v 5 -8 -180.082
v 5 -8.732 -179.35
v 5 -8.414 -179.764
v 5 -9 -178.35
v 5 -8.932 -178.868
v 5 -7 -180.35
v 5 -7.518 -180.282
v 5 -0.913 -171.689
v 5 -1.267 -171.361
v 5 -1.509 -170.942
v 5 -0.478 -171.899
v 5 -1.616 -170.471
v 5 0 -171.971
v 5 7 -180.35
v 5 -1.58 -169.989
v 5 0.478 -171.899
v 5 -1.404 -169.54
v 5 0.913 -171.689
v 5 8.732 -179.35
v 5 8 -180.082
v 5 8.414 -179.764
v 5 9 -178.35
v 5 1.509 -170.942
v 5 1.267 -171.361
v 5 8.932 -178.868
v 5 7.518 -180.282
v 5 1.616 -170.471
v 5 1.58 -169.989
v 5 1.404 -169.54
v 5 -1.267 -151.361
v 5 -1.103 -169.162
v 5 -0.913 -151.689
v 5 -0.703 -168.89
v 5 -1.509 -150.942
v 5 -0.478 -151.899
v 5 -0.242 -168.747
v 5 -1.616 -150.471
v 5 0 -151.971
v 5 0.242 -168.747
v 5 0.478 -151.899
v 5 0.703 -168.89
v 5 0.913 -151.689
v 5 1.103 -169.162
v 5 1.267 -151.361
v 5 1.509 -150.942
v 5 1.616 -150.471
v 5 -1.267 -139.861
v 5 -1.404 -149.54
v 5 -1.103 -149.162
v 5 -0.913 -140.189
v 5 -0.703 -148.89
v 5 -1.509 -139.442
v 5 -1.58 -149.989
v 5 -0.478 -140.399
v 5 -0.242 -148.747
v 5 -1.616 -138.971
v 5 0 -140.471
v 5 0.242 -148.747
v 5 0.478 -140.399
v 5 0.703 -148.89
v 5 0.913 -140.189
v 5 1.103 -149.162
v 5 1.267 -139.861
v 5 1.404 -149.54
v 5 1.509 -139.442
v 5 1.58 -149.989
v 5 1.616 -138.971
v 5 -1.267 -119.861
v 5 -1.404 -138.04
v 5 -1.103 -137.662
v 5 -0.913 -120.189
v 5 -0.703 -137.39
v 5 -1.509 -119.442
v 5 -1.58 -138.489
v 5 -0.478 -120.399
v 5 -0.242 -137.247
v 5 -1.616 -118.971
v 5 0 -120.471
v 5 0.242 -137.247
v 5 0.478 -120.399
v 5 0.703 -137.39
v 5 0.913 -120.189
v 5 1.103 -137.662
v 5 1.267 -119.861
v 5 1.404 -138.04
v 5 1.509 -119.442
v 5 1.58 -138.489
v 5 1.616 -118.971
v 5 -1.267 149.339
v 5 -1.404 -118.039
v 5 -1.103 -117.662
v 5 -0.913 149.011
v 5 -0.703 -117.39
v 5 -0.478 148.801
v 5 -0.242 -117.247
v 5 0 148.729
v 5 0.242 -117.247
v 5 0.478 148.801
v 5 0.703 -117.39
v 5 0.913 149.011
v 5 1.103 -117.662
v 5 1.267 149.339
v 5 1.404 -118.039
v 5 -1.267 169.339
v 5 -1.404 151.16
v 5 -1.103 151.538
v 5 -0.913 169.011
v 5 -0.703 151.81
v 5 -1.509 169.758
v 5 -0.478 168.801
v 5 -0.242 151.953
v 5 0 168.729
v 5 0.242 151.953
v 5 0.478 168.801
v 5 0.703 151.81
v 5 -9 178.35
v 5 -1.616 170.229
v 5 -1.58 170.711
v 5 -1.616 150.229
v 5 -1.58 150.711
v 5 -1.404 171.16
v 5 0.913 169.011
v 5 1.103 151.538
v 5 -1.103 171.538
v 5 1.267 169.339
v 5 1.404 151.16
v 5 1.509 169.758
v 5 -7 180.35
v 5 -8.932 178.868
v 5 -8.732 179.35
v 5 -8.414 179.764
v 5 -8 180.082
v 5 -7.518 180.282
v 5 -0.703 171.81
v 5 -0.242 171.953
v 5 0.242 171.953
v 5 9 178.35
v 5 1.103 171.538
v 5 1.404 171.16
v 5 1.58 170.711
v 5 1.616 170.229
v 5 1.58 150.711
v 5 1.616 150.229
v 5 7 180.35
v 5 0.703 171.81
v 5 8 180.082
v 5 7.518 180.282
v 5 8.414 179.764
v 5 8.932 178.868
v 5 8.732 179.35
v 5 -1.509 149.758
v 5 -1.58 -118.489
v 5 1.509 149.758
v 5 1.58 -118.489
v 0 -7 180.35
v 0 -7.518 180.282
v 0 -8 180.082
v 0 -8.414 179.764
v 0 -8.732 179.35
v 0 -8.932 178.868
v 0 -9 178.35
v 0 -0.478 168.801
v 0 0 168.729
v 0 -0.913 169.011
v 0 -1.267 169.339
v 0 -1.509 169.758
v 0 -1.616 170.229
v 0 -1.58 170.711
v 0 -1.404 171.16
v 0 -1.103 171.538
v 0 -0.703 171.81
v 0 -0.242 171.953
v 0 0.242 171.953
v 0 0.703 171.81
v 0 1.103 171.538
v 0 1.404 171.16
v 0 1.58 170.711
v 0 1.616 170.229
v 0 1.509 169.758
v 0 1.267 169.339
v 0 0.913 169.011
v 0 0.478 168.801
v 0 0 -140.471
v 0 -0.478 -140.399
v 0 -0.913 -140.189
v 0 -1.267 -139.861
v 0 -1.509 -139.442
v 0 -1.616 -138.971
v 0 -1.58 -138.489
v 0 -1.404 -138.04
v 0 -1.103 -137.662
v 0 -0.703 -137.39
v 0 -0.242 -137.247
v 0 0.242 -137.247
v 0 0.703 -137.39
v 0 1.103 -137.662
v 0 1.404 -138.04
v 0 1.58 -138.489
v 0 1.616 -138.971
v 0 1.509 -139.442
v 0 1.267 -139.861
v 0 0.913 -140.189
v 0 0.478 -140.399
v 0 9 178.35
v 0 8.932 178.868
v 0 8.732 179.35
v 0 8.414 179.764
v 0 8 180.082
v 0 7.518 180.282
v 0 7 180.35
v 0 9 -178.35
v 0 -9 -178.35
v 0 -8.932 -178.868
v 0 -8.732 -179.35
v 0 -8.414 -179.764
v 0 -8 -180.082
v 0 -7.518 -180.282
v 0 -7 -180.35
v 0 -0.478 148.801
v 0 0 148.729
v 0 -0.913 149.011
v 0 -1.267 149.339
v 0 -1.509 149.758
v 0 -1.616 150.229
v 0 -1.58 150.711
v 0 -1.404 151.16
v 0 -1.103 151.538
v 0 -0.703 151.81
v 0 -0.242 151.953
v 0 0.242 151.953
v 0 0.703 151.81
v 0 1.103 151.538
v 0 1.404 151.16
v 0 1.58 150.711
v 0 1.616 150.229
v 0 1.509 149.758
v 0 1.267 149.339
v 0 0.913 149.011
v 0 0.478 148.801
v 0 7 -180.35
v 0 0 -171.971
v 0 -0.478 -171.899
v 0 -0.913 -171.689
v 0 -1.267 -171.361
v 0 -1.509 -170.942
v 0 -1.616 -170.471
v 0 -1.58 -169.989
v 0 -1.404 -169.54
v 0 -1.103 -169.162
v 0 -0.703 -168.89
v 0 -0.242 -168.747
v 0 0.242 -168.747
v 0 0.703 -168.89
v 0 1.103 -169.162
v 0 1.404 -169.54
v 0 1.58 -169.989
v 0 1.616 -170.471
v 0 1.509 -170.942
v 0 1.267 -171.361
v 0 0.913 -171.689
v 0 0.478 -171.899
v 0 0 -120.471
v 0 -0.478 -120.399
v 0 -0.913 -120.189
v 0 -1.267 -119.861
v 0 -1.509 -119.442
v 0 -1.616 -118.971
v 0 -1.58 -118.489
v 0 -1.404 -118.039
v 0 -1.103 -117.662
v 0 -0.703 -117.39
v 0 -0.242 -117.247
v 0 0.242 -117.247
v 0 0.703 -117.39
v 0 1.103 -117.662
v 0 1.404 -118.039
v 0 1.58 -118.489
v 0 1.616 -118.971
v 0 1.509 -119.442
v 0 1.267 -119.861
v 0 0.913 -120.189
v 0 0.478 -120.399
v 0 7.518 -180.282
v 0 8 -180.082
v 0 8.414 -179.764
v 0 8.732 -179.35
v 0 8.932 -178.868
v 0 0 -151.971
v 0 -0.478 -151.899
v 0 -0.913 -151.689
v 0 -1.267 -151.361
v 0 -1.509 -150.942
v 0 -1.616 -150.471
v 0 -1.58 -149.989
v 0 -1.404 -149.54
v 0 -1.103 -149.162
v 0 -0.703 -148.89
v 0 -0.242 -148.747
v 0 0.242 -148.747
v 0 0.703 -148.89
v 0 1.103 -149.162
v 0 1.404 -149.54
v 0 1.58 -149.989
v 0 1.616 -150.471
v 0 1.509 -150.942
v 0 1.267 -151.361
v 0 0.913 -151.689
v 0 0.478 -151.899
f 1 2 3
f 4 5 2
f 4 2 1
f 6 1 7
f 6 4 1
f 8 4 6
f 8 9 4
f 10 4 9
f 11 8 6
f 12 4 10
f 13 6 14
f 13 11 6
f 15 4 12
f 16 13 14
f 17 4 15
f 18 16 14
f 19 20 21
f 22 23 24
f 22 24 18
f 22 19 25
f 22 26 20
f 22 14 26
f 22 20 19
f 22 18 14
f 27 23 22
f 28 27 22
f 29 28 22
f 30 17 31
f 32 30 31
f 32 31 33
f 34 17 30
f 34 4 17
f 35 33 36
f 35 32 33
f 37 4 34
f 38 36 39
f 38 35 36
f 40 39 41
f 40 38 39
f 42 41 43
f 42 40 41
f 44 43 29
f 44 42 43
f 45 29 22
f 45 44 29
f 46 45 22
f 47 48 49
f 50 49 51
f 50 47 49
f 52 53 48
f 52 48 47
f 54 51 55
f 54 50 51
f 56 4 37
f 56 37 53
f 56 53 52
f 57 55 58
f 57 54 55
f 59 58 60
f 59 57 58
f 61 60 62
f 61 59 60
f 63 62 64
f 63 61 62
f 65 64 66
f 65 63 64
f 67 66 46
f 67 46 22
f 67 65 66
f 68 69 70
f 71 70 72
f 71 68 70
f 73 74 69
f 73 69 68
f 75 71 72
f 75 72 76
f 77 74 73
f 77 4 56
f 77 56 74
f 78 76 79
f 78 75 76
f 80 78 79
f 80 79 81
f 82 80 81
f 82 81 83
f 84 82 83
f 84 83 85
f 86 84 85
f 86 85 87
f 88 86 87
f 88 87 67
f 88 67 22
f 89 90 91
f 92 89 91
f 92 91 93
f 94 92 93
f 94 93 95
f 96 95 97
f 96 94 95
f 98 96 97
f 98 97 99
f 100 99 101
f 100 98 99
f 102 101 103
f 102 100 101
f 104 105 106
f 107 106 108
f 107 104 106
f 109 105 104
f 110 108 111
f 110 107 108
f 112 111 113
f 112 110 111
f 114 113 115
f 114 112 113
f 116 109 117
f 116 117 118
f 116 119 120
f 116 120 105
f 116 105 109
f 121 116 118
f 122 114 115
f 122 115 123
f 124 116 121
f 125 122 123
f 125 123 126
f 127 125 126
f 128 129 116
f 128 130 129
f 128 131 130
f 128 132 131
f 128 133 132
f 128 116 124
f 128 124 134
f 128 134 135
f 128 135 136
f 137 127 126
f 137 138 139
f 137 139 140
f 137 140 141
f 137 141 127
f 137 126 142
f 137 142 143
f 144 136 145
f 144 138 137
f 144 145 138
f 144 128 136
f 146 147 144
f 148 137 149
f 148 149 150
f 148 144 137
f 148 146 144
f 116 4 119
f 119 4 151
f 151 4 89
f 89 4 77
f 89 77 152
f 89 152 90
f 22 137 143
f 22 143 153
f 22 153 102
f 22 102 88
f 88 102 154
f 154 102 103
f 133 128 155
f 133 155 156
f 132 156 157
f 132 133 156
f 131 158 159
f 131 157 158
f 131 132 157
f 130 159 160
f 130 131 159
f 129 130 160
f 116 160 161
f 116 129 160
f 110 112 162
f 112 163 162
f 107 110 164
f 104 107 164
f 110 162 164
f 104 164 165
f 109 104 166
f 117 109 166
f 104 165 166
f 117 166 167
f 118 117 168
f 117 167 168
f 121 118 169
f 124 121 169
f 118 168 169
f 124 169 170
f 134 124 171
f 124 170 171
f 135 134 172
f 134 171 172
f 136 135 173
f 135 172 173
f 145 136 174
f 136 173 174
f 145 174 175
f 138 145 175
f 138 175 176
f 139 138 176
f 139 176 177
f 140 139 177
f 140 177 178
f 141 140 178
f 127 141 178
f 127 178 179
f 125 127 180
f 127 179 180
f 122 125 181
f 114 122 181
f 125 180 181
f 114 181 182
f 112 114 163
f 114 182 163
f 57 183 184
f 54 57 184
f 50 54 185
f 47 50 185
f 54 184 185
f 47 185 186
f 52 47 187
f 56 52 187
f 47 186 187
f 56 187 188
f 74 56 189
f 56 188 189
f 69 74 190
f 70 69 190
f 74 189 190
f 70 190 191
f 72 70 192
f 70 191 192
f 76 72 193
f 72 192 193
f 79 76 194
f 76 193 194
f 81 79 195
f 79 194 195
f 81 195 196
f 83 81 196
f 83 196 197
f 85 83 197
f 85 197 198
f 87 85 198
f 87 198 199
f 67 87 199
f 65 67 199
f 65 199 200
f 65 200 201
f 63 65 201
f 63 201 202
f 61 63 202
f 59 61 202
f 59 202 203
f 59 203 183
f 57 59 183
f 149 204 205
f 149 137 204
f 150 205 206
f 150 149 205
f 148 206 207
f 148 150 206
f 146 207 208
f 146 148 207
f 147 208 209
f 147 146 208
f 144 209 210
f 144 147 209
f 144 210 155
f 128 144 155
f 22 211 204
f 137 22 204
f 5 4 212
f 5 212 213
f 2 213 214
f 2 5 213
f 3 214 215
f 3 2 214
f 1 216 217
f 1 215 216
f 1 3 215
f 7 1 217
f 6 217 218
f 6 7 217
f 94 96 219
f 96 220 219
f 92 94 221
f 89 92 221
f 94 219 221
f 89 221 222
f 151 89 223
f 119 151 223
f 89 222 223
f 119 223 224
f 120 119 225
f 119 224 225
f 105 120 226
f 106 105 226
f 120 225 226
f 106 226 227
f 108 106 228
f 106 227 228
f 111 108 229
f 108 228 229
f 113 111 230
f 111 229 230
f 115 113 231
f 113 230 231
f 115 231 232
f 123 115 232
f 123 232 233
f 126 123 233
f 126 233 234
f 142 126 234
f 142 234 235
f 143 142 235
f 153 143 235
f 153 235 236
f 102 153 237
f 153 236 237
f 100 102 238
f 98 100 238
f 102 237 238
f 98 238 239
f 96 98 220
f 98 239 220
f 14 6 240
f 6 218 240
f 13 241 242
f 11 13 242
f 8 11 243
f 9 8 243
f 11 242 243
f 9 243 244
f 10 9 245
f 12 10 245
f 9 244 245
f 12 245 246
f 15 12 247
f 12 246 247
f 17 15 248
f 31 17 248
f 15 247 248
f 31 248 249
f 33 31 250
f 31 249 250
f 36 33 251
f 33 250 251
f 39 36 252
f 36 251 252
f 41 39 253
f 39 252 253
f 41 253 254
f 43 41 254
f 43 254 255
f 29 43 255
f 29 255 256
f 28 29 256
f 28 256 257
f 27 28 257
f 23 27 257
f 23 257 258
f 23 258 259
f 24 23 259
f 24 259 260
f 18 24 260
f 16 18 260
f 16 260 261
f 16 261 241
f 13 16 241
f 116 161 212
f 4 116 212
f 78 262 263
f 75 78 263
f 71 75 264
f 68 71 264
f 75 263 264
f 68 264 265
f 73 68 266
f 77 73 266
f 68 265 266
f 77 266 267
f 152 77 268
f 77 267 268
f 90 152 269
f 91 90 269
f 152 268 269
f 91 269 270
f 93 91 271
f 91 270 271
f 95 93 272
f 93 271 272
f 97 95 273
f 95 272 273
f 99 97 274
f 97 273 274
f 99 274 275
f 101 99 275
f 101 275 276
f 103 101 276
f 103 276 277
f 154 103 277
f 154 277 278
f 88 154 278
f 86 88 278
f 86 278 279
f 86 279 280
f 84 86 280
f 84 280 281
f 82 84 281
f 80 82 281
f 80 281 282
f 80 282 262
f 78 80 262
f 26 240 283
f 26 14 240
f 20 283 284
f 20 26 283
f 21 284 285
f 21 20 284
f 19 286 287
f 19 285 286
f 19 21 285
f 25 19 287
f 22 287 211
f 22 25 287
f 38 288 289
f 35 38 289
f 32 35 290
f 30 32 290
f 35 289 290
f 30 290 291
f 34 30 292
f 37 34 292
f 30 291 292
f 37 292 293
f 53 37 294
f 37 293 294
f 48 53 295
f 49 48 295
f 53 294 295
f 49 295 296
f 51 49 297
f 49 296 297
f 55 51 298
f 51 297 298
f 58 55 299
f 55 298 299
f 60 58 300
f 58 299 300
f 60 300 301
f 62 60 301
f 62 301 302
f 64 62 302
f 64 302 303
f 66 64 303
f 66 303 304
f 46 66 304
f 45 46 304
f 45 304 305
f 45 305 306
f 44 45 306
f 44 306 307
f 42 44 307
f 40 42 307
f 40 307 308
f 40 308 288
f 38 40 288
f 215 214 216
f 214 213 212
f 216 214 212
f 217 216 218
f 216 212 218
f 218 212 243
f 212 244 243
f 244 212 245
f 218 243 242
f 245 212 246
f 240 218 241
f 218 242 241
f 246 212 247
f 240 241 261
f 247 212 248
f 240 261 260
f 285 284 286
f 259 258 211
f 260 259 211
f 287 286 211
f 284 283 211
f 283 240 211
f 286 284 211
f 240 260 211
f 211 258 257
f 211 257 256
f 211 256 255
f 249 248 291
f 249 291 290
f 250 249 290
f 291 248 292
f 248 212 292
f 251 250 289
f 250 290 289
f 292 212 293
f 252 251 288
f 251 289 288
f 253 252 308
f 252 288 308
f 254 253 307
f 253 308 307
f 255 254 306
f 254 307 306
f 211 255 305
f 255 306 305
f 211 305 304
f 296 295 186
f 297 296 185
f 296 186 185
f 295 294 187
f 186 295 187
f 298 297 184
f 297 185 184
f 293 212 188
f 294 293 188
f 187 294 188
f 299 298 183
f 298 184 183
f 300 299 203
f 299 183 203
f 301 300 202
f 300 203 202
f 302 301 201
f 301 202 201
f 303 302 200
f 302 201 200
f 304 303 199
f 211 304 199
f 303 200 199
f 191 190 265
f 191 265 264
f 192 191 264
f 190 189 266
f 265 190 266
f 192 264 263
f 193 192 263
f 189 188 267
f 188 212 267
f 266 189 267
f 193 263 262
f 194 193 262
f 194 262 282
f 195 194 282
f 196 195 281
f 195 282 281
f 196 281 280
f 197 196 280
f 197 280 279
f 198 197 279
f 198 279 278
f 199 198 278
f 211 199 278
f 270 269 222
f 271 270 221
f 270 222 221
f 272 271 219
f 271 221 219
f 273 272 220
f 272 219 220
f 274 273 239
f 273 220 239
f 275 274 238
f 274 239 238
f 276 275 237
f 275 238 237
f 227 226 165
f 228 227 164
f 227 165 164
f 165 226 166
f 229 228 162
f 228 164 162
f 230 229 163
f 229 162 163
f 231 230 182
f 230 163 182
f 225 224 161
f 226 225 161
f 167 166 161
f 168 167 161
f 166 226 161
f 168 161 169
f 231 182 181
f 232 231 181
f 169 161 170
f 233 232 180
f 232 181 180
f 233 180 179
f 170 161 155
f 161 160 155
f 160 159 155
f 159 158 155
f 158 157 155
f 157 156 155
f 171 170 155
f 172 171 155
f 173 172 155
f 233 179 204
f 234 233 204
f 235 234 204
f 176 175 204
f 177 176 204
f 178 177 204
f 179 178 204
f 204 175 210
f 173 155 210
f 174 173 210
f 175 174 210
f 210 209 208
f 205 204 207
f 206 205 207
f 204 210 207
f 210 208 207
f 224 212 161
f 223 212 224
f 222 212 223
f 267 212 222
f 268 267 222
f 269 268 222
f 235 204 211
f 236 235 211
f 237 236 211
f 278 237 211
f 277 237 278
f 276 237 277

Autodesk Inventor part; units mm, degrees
ref_plane "YZ Plane" through (0, 0, 0) normal (1, 0, 0) x (0, 1, 0)
ref_plane "XZ Plane" through (0, 0, 0) normal (0, 1, 0) x (-1, 0, 0)
ref_plane "XY Plane" through (0, 0, 0) normal (0, 0, 1) x (1, 0, 0)
sketch "Skizze1" plane through (0, 0, 0) normal (1, 0, 0) x (0, 1, 0)
  line L0 (9, 180.35) -> (-9, 180.35)
  line L1 (-9, 180.35) -> (-9, -180.35)
  line L2 (-9, -180.35) -> (9, -180.35)
  line L3 (9, -180.35) -> (9, 180.35)
  point P0 (0, 0)
  point P1 (-9, 0)
  point P2 (0, -180.35)
  dimension "d0" = 360.7
  dimension "d1" = 18
extrude "Extrusion1" add sketch "Skizze1" along normal blind 5
fillet "Rundung1" radius 2 4 edges at (2.5, 9, 180.35) (2.5, -9, 180.35) (2.5, 9, -180.35) (2.5, -9, -180.35)
sketch "Skizze2" plane through (5, 0, 0) normal (1, 0, 0) x (0, 0, -1)
  line L0 (-180.35, 7) -> (-180.35, -7) projected
  line L1 (178.35, 9) -> (-178.35, 9) projected
  line L2 (148.85, 9) -> (148.85, -9) construction
  line L3 (-178.35, -9) -> (178.35, -9) projected
  line L4 (180.35, -7) -> (180.35, 7) projected
  point P0 (0, 0)
  point P1 (-170.35, 0)
  point P2 (-150.35, 0)
  point P3 (138.85, 0)
  point P4 (118.85, 0)
  point P5 (170.35, 0)
  point P6 (150.35, 0)
  dimension "d5" = 10
  dimension "d6" = 20
  dimension "d7" = 329.2
  dimension "d8" = 10
  dimension "d9" = 20
  dimension "d10" = 10
  dimension "d11" = 20
hole "Bohrung1" at (5, 0, -138.85) at (5, 0, -118.85) at (5, 0, -170.35) at (5, 0, -150.35) at (5, 0, 150.35) at (5, 0, 170.35) direction (-1, 0, 0) diameter 3.242 end through all thread size "M4x0.7" class "6H" standard "ISO Metric profile"
equation "\"d_tol\" = 0.3"
equation "\"d_wand\" = 1.5"
equation "\"b_rasp_pi\" = 56"
equation "\"w_kamera_hori\" = 66deg"
equation "\"l_rasp_pi\" = 85"
equation "\"w_kamera_vert\" = 41deg"
equation "\"r_rasp_pi\" = 3"
equation "\"D_oct\" = 3621.32034"
equation "\"D_hexadeca\" = 7541.00924"
equation "\"d_traeger\" = 625"
properties part number "Sstab"
